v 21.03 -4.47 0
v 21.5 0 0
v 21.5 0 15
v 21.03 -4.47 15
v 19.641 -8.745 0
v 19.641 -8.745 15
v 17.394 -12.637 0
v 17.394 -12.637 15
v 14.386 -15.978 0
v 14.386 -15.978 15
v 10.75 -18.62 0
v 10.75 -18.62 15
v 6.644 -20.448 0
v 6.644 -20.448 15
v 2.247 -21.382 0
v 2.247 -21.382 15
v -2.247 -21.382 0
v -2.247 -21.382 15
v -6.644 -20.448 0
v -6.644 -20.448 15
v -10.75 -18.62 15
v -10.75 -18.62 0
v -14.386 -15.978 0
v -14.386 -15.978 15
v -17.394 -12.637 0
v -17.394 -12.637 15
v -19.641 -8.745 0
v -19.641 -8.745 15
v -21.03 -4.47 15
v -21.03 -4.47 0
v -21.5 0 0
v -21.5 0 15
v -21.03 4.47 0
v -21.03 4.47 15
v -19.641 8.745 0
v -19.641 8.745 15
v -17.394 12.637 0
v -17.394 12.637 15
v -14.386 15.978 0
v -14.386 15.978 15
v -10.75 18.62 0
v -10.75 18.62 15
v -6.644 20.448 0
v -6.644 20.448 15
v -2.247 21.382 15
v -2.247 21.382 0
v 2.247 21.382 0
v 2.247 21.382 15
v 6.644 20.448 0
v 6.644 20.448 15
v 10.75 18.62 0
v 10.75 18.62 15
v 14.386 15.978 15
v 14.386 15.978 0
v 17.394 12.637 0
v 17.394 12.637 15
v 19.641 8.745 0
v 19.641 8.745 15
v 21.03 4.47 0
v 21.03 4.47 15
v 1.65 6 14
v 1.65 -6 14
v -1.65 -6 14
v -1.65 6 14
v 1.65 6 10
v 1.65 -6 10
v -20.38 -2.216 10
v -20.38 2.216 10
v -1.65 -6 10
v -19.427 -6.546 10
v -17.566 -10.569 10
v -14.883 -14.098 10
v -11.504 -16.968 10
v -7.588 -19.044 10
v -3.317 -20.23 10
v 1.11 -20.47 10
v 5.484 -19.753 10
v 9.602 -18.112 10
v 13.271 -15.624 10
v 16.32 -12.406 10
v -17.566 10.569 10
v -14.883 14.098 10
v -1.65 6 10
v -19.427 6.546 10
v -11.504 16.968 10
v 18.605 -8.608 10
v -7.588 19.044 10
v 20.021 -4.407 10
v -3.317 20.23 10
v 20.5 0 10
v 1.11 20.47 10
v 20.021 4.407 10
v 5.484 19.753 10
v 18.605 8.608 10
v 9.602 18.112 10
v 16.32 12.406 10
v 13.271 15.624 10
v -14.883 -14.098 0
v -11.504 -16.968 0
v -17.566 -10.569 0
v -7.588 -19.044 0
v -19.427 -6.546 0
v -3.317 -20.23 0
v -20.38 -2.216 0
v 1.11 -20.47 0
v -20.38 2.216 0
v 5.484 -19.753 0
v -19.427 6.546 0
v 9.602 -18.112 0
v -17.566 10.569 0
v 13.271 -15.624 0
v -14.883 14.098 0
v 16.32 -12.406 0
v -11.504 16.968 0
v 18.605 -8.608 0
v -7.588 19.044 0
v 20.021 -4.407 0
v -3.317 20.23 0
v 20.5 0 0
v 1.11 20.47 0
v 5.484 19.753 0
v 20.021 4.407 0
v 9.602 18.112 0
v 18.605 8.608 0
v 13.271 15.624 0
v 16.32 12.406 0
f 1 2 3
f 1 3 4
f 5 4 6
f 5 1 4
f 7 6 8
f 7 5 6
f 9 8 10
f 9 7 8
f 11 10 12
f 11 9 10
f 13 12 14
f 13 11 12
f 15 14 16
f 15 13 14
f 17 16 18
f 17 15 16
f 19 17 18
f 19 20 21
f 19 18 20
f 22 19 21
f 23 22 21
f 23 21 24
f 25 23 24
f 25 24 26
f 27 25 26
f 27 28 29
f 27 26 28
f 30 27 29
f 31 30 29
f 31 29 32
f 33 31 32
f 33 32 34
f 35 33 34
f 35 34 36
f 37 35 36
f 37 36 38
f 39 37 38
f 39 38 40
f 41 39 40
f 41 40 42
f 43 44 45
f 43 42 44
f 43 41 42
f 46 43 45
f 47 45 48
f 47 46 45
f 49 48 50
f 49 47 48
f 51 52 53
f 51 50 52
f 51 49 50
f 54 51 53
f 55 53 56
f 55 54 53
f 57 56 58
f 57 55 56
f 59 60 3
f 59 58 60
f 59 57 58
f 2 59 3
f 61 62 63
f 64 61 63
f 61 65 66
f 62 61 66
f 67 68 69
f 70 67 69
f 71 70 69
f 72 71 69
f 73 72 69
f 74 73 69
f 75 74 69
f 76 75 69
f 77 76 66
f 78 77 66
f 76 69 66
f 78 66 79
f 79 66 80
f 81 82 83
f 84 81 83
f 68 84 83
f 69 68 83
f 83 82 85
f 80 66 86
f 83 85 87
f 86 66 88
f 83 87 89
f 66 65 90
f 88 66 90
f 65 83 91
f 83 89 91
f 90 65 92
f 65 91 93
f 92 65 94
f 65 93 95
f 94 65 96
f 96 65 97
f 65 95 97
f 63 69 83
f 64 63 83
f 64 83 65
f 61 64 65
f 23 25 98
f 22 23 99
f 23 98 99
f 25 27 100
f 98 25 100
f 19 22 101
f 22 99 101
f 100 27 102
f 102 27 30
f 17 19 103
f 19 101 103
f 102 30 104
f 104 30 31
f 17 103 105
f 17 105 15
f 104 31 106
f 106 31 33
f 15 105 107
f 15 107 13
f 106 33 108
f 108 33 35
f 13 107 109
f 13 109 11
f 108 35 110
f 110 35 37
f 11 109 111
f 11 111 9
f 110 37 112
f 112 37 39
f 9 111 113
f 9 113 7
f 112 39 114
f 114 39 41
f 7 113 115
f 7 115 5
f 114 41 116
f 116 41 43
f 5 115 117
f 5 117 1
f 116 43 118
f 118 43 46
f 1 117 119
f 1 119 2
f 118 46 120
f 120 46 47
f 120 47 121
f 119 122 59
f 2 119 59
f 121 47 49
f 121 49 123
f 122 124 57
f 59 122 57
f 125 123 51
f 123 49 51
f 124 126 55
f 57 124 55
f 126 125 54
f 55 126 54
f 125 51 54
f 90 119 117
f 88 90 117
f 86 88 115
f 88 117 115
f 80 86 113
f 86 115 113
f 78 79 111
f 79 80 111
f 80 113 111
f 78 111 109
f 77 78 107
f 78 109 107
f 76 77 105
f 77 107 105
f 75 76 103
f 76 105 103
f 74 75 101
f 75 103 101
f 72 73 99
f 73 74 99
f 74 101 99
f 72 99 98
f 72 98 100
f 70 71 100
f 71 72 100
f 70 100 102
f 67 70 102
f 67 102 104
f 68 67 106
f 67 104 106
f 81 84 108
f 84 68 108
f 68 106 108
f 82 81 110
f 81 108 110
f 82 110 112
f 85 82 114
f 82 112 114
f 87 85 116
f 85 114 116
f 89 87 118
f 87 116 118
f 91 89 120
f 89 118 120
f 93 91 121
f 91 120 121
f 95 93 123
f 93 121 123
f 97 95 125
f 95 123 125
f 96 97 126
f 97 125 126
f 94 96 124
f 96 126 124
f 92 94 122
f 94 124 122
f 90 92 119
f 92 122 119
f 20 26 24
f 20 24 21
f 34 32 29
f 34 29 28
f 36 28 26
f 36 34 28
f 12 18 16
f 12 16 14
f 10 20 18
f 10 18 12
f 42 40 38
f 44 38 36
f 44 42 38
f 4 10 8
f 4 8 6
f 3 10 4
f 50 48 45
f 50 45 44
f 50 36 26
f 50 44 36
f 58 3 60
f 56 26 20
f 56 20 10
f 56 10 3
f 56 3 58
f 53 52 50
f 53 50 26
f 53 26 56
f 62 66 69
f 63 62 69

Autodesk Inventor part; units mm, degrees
ref_plane "YZ Plane" through (0, 0, 0) normal (1, 0, 0) x (0, 1, 0)
ref_plane "XZ Plane" through (0, 0, 0) normal (0, 1, 0) x (-1, 0, 0)
ref_plane "XY Plane" through (0, 0, 0) normal (0, 0, 1) x (1, 0, 0)
sketch "Esquisse1" plane through (0, 0, 0) normal (0, 0, 1) x (1, 0, 0)
  circle A0 centre (0, 0) radius 20.5
  circle A1 centre (0, 0) radius 21.5
  line L0 (0.7498, -6.187) -> (-0.7498, -6.187)
  line L1 (-0.7498, -6.187) -> (-0.7498, 6.187)
  line L2 (-0.7498, 6.187) -> (0.7498, 6.187)
  line L3 (0.7498, 6.187) -> (0.7498, -6.187)
  line L4 (0.7498, -6.187) -> (-0.7498, 6.187) construction
  line L5 (-0.7498, -6.187) -> (0.7498, 6.187) construction
  point P0 (20.5, 0)
  point P1 (21.5, 0)
  dimension "d0" = 41
  dimension "d1" = 43
  dimension "d16" = 1
extrude "Extrusion1" add sketch "Esquisse1" along normal blind 15 contours A1
sketch "Esquisse2" plane through (0, 0, 15) normal (0, 0, 1) x (1, 0, 0)
  circle A0 centre (0, 0) radius 20.5
extrude "Extrusion2" add sketch "Esquisse2" against normal blind 5
sketch "Esquisse3" plane through (0, 0, 10) normal (0, 0, -1) x (-1, 0, 0)
  line L0 (1.65, 6) -> (-1.65, 6)
  line L1 (-1.65, 6) -> (-1.65, -6)
  line L2 (-1.65, -6) -> (1.65, -6)
  line L3 (1.65, -6) -> (1.65, 6)
  line L4 (1.65, 6) -> (-1.65, -6) construction
  line L5 (-1.65, 6) -> (1.65, -6) construction
  point P0 (0, 0)
  dimension "d8" = 12
  dimension "d9" = 3.3
extrude "Extrusion3" cut sketch "Esquisse3" against normal blind 4
properties part number "Support pasApas"
